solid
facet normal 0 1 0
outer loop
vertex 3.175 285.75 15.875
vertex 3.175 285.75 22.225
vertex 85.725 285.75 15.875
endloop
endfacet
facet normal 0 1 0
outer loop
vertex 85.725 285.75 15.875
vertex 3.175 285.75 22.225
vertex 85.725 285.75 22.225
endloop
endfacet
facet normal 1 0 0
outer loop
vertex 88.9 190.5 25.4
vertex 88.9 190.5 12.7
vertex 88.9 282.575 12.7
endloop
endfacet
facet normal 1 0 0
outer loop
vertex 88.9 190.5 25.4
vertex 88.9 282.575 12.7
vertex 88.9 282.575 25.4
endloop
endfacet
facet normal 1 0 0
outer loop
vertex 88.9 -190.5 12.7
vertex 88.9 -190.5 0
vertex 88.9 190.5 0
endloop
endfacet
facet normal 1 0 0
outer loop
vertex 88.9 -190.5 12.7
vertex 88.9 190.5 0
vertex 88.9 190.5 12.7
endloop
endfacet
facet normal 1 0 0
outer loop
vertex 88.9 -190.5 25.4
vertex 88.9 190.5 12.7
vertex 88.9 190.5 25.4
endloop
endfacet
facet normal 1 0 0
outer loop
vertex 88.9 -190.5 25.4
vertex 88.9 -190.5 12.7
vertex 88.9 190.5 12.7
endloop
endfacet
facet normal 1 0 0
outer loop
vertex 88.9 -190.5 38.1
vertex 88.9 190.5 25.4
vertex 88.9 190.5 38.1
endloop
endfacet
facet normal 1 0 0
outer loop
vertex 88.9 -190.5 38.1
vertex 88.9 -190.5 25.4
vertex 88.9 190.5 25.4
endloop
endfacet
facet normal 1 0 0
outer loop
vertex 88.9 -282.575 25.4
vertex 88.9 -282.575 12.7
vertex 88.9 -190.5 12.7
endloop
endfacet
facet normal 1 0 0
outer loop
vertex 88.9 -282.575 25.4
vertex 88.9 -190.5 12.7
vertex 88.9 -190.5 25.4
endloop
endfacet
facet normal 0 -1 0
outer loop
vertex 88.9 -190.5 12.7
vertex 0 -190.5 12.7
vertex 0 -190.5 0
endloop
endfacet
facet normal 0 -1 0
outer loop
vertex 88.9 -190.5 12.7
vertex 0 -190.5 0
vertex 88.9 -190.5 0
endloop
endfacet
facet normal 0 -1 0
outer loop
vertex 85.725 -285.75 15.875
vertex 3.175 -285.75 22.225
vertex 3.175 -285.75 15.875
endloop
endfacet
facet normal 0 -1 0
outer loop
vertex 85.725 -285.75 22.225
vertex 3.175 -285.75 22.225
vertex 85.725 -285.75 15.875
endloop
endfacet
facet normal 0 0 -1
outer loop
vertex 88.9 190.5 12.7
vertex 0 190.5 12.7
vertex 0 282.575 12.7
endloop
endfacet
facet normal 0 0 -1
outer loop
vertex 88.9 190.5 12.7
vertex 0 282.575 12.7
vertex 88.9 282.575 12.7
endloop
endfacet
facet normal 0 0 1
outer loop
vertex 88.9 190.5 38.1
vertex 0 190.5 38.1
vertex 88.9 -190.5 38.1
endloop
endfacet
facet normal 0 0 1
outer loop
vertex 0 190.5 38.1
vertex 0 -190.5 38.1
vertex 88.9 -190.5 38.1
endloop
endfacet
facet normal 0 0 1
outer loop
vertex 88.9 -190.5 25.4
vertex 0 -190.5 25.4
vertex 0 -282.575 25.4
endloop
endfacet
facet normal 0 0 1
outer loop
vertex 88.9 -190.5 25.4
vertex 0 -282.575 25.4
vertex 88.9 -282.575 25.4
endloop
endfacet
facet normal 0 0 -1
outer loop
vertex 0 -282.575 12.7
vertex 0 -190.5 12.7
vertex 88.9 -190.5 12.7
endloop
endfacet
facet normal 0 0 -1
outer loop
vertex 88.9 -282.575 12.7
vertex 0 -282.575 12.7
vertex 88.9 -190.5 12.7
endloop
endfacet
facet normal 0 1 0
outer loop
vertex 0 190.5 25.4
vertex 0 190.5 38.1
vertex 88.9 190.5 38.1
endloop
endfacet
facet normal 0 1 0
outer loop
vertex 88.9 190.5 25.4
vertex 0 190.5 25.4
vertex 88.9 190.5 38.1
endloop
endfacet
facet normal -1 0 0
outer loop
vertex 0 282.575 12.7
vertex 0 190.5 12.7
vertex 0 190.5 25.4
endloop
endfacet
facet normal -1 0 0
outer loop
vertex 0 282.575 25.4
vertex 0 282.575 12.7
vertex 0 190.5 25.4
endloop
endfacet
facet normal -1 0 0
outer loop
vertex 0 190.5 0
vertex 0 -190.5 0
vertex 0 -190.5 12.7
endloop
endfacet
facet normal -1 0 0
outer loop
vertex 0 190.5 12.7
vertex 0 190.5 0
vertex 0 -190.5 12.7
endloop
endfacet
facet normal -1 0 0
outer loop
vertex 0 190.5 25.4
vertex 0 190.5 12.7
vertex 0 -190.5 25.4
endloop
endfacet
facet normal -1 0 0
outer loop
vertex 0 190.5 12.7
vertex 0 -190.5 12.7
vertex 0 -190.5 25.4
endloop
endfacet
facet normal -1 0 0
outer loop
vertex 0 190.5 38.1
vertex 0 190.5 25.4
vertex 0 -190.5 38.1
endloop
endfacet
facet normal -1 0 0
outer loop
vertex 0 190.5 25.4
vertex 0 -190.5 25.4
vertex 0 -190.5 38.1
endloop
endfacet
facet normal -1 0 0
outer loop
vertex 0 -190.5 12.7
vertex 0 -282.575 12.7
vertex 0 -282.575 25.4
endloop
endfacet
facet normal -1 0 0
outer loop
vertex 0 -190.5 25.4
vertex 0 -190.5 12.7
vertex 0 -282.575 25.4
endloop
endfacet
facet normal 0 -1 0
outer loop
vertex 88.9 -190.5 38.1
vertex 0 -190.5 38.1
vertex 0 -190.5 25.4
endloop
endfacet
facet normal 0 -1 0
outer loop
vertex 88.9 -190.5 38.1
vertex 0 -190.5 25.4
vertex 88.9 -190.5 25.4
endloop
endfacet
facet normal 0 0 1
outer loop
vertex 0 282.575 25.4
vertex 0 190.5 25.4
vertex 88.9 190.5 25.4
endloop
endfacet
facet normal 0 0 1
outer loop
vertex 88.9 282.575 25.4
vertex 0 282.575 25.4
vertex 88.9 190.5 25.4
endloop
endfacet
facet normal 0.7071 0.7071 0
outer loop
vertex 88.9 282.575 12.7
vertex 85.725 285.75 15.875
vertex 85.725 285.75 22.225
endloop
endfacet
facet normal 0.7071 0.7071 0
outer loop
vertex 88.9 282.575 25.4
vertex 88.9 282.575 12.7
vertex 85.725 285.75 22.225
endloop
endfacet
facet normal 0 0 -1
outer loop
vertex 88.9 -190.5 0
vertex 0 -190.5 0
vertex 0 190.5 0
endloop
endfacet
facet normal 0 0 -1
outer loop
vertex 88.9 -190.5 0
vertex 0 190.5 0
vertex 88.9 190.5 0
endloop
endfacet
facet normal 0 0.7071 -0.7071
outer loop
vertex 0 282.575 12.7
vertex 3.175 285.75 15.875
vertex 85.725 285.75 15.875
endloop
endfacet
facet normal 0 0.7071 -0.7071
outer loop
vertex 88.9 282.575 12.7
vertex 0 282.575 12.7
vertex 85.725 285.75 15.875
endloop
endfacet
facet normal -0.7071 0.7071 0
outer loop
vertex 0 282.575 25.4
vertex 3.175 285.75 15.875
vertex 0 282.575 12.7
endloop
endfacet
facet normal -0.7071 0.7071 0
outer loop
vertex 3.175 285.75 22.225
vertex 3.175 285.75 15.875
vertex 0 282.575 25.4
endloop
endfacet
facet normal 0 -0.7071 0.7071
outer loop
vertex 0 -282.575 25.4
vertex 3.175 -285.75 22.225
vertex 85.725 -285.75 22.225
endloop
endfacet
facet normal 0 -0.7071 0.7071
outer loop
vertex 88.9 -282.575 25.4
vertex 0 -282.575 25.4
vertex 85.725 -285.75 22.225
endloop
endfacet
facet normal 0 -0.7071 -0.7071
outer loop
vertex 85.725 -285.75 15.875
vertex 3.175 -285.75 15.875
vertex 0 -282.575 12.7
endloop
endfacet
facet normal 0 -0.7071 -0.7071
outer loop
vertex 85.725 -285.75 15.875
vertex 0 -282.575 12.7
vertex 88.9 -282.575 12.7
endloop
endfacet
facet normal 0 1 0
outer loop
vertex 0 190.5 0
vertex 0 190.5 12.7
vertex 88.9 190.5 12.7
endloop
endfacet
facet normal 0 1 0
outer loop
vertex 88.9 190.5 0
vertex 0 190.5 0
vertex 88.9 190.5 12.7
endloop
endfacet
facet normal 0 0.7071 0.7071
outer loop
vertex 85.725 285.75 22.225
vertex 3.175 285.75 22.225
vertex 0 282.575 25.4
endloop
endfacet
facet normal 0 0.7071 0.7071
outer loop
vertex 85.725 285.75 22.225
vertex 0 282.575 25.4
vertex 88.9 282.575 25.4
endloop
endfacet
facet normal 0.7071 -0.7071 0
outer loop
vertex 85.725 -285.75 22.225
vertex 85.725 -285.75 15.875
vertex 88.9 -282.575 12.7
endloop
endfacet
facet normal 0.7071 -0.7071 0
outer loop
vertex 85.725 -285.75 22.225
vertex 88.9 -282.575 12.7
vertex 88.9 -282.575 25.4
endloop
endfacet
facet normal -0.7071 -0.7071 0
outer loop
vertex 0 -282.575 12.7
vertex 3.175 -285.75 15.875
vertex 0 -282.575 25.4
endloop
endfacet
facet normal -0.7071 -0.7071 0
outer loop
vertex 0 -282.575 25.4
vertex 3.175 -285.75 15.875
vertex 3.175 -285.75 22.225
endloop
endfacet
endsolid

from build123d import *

# Parameters (mm, degrees)
F0_W     = 88.9
F0_H     = 38.1
F1_DEPTH = 190.5
F2_W     = 88.9
F2_H     = 12.7
F3_DEPTH = 95.25
F4_SIZE  = 3.175


with BuildPart() as f1:
    # F0 (on Front) → F1 (new body)
    with BuildSketch(Plane.XZ):
        with Locations((44.45, 19.05)):
            Rectangle(F0_W, F0_H)
    extrude(amount=F1_DEPTH)

    # F2 (on face) → F3 (join)
    with BuildSketch(Plane.XZ.offset(190.5)):
        with Locations((44.45, 19.05)):
            Rectangle(F2_W, F2_H)
    extrude(amount=F3_DEPTH)

    # F4
    f4_edges = [f1.edges().sort_by_distance(p)[0] for p in [
        (44.45, -285.75, 25.4),
        (0, -285.75, 19.05),
        (44.45, -285.75, 12.7),
        (88.9, -285.75, 19.05),
    ]]
    chamfer(f4_edges, length=F4_SIZE)

    # F5: F1 across face


with BuildPart() as f1_1:
    add(f1.part)
    add(f1.part.mirror(Plane(origin=(44.45, 0, 19.05), x_dir=(1, 0, 0), z_dir=(0, 1, 0))))


solid = f1_1.part
